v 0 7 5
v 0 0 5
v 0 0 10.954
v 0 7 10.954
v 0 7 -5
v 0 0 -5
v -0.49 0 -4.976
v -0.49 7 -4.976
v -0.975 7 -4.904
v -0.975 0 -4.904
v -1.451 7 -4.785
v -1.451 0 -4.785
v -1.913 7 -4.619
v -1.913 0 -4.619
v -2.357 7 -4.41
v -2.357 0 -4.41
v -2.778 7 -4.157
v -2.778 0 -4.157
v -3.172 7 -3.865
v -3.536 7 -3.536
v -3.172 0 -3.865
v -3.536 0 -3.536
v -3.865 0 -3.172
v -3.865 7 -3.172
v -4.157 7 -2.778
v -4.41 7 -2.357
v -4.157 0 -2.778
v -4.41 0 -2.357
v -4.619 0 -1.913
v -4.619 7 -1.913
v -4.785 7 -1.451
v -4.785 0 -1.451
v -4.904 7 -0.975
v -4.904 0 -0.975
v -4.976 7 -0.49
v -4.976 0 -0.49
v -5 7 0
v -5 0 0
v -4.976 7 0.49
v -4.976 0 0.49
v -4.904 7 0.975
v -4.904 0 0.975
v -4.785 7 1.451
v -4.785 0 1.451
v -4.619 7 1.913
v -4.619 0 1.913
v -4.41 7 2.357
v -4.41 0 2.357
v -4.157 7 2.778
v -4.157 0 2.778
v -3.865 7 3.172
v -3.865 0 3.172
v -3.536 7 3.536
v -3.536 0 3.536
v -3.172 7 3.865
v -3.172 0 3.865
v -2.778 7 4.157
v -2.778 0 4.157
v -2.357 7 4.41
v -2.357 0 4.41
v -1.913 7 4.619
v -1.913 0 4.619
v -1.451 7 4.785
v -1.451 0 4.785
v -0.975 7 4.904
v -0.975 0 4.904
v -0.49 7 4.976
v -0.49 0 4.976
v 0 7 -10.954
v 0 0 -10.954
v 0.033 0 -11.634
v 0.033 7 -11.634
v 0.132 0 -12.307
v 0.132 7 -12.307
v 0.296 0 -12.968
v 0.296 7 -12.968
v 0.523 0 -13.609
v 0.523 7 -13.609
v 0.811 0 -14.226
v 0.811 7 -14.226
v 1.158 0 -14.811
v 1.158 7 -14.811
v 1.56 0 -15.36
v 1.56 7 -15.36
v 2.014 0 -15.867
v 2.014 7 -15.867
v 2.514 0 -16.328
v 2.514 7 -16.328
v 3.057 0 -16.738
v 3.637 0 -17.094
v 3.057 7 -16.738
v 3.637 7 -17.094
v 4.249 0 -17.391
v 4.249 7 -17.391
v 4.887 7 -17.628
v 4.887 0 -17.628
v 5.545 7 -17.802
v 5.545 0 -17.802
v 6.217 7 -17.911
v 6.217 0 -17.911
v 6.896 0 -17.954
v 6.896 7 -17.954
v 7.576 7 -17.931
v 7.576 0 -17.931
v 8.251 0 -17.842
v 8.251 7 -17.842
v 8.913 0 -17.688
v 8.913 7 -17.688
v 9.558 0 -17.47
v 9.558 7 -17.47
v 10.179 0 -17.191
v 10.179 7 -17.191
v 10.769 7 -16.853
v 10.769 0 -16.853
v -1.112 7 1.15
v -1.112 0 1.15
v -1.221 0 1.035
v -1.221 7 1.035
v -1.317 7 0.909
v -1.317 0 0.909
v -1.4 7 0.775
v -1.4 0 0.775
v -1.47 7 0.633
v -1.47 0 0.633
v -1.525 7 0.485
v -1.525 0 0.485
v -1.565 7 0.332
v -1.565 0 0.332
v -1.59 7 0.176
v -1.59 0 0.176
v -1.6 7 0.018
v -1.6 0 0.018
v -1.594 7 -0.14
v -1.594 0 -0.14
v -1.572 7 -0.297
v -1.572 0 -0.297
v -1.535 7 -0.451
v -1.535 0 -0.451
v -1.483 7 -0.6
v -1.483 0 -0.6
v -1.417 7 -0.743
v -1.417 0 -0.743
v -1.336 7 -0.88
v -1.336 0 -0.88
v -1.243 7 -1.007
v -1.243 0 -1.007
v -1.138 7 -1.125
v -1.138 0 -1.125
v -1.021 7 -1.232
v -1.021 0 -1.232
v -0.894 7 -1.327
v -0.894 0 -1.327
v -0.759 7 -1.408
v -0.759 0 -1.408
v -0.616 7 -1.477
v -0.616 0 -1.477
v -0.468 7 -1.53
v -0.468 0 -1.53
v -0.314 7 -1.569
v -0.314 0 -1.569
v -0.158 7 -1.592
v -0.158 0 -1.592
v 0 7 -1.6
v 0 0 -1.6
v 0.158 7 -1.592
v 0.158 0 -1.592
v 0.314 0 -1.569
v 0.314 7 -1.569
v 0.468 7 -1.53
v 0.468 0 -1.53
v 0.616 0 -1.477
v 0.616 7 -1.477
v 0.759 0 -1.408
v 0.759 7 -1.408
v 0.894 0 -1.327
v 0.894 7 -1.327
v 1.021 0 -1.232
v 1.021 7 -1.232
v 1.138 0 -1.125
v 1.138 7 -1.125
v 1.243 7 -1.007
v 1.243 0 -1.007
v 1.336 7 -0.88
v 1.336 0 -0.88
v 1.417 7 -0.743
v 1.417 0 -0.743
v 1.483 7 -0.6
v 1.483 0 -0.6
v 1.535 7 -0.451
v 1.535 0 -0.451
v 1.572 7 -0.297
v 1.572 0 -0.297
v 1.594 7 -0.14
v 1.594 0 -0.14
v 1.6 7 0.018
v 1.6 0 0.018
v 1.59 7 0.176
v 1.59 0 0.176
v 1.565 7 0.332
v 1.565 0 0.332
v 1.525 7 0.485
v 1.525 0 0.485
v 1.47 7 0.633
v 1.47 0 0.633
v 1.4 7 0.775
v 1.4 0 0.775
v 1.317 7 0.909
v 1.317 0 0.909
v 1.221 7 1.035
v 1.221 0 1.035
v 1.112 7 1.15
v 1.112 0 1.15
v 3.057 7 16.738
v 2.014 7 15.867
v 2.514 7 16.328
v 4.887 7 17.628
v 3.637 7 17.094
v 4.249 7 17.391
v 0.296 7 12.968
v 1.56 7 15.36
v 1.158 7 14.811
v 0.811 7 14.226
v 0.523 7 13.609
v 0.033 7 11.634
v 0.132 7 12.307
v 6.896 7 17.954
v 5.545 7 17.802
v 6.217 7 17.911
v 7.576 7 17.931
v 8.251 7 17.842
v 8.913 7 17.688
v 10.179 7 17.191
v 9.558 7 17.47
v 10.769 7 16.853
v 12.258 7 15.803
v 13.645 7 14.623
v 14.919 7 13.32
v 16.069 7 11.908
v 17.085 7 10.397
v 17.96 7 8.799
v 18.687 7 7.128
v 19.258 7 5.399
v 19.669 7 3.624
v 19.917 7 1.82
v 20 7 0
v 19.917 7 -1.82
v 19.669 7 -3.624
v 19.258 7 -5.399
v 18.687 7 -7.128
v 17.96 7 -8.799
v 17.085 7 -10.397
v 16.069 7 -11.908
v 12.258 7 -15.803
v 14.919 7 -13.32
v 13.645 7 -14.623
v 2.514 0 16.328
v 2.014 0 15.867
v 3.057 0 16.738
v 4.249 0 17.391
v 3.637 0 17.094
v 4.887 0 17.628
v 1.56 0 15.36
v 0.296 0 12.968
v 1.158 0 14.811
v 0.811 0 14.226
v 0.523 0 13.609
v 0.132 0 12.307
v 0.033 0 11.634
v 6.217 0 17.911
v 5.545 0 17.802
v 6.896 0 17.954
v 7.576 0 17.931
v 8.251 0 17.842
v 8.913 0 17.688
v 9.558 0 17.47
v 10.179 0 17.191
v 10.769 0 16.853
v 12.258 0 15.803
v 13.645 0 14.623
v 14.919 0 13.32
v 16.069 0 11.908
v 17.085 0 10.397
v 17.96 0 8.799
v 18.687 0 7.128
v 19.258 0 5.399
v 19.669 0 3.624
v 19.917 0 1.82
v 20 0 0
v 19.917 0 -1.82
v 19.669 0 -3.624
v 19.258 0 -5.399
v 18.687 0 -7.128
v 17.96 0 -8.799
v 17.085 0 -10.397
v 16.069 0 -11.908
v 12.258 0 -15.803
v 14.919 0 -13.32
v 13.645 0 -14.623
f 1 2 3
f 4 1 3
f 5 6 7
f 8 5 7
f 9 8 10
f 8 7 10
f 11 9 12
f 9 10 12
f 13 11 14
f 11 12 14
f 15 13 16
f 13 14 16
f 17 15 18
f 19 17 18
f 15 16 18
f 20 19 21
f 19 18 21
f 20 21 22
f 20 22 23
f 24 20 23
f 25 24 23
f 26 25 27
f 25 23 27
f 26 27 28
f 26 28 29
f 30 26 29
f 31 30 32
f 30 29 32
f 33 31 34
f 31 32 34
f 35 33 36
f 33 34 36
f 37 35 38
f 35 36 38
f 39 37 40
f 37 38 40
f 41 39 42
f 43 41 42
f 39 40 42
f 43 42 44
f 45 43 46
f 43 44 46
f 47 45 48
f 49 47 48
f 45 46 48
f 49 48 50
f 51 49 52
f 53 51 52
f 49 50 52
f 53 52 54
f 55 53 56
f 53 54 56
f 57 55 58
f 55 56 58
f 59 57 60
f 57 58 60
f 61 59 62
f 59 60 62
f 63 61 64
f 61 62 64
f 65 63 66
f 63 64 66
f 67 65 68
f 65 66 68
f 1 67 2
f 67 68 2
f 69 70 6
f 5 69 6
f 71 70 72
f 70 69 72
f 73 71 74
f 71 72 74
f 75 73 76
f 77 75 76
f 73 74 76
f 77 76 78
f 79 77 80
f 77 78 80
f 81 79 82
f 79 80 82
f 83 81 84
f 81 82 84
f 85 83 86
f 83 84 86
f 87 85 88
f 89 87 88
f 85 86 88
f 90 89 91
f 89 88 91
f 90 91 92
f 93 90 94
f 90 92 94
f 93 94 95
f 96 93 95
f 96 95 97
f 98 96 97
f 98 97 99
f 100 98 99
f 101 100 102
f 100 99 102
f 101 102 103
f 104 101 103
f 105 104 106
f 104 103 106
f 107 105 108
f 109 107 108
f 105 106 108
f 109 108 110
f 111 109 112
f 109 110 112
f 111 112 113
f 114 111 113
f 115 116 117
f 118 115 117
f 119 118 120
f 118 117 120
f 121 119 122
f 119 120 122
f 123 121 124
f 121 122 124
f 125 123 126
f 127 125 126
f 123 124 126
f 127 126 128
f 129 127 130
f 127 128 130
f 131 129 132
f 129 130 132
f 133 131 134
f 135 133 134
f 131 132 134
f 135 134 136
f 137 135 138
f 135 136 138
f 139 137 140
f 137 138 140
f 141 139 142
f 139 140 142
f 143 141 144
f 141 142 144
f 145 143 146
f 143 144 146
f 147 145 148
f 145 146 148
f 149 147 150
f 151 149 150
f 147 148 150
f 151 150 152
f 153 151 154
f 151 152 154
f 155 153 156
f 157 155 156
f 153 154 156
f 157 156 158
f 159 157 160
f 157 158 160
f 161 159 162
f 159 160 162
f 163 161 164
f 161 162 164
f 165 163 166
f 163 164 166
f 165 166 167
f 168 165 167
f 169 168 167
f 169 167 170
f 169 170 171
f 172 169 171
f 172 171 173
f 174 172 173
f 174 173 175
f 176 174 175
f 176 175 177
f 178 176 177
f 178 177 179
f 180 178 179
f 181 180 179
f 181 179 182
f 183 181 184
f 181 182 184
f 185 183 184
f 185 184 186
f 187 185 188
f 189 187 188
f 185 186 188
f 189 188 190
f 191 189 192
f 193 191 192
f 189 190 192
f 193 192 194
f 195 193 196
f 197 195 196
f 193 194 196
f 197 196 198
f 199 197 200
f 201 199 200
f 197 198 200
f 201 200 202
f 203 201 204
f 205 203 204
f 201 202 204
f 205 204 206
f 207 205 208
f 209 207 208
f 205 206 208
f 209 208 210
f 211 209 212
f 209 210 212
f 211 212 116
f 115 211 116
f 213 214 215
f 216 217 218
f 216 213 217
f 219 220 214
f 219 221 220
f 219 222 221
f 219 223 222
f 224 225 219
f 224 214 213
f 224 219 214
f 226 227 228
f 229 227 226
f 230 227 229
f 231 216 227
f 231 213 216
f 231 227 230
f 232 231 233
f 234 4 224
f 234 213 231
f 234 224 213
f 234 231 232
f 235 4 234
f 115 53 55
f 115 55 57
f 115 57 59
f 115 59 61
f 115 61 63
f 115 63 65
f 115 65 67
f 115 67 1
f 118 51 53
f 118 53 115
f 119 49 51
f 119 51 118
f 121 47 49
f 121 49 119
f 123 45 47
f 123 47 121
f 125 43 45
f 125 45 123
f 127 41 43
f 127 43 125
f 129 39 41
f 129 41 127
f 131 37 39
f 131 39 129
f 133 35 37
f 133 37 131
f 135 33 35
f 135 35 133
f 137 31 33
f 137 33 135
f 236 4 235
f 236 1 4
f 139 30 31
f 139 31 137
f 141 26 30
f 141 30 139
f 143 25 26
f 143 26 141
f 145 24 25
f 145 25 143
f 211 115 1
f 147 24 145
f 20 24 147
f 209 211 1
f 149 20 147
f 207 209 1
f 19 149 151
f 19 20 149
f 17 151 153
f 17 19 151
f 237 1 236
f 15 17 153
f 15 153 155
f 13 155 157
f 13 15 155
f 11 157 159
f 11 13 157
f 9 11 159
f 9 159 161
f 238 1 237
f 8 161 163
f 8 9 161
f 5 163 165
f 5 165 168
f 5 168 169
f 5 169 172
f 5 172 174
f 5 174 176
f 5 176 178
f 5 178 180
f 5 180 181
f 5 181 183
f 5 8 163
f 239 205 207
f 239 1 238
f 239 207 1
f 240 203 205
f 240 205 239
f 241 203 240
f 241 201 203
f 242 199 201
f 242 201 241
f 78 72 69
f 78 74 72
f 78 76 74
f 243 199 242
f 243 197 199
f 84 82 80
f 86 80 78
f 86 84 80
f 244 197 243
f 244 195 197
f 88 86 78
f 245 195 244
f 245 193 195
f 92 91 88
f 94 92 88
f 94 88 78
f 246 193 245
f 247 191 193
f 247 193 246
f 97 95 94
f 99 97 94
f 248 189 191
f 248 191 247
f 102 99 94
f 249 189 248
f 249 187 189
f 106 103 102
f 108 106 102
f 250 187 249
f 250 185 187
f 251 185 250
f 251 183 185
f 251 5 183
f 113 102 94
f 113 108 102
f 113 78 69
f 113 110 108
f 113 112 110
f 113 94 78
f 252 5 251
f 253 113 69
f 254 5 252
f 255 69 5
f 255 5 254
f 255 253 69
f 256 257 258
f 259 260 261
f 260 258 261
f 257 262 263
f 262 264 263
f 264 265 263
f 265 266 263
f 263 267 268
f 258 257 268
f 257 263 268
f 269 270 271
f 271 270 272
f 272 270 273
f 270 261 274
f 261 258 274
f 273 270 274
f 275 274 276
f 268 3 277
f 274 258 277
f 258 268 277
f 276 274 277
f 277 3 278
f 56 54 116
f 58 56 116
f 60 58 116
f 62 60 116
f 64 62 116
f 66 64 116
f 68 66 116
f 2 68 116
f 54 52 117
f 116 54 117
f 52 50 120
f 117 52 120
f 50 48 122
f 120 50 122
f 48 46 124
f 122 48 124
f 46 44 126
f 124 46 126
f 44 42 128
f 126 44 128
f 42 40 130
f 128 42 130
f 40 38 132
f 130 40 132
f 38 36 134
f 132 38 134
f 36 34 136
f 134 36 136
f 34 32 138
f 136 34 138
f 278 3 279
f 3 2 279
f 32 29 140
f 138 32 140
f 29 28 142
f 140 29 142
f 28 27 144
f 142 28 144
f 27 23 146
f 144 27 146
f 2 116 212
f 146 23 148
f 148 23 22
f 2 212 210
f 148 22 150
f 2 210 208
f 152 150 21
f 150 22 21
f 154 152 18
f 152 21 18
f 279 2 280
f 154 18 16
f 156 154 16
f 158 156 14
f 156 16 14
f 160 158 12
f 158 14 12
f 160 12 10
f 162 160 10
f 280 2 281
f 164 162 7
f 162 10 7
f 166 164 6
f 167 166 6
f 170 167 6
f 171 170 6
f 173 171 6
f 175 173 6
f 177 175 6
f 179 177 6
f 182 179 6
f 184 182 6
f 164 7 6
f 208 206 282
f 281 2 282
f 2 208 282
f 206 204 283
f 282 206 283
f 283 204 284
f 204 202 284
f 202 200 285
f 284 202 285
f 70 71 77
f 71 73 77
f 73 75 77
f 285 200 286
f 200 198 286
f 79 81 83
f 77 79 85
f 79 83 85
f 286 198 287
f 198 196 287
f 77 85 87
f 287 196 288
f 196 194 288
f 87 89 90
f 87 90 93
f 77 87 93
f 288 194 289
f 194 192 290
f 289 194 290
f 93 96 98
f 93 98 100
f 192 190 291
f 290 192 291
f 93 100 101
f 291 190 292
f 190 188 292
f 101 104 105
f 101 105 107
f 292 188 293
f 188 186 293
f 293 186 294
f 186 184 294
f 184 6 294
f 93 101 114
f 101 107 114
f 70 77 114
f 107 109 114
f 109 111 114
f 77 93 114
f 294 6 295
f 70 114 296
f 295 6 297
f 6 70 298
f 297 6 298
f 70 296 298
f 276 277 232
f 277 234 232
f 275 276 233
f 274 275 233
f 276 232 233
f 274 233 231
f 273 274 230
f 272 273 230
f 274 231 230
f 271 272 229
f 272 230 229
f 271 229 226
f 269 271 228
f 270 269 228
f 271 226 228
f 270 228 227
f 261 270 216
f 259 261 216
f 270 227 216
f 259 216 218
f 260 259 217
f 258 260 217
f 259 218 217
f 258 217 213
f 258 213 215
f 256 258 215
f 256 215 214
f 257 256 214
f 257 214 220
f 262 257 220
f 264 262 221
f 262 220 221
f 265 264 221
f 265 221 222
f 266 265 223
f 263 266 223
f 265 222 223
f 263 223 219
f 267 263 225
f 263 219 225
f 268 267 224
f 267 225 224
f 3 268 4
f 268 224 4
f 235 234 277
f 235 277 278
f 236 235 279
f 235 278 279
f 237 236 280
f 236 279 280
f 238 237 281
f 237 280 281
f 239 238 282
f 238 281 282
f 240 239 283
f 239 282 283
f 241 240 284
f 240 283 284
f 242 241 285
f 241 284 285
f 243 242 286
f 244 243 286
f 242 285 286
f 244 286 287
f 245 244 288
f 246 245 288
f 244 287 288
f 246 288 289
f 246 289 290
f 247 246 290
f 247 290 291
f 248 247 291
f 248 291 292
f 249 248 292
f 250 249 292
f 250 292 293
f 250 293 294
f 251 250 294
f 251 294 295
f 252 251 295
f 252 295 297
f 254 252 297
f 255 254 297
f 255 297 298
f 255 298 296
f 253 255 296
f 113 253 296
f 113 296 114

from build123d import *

# Parameters (mm, degrees)
BOSS_EXTRUDE1_DEPTH = 7
FILLET1_R           = 7


with BuildPart() as part:
    # Sketch1 → Boss-Extrude1 (new body)
    with BuildSketch(Plane(origin=(0, 0, 0), x_dir=(1, 0, 0), z_dir=(0, 1, 0))):
        with BuildLine():
            Line((0, 20), (0, 5))
            ThreePointArc((0, 5), (-5, 0), (0, -5))
            Line((0, -5), (0, -20))
            ThreePointArc((0, -20), (20, 0), (0, 20))
        make_face()
        with BuildLine():
            Line((1.112429773, -1.15), (-1.112429773, -1.15))
            ThreePointArc((-1.112429773, -1.15), (0, 1.6), (1.112429773, -1.15))
        make_face(mode=Mode.SUBTRACT)
    extrude(amount=BOSS_EXTRUDE1_DEPTH)

    # Fillet1
    fillet1_edges = [part.edges().sort_by_distance(p)[0] for p in [
        (0, 3.5, 20),
        (0, 3.5, -20),
    ]]
    fillet(fillet1_edges, radius=FILLET1_R)


solid = part.part
